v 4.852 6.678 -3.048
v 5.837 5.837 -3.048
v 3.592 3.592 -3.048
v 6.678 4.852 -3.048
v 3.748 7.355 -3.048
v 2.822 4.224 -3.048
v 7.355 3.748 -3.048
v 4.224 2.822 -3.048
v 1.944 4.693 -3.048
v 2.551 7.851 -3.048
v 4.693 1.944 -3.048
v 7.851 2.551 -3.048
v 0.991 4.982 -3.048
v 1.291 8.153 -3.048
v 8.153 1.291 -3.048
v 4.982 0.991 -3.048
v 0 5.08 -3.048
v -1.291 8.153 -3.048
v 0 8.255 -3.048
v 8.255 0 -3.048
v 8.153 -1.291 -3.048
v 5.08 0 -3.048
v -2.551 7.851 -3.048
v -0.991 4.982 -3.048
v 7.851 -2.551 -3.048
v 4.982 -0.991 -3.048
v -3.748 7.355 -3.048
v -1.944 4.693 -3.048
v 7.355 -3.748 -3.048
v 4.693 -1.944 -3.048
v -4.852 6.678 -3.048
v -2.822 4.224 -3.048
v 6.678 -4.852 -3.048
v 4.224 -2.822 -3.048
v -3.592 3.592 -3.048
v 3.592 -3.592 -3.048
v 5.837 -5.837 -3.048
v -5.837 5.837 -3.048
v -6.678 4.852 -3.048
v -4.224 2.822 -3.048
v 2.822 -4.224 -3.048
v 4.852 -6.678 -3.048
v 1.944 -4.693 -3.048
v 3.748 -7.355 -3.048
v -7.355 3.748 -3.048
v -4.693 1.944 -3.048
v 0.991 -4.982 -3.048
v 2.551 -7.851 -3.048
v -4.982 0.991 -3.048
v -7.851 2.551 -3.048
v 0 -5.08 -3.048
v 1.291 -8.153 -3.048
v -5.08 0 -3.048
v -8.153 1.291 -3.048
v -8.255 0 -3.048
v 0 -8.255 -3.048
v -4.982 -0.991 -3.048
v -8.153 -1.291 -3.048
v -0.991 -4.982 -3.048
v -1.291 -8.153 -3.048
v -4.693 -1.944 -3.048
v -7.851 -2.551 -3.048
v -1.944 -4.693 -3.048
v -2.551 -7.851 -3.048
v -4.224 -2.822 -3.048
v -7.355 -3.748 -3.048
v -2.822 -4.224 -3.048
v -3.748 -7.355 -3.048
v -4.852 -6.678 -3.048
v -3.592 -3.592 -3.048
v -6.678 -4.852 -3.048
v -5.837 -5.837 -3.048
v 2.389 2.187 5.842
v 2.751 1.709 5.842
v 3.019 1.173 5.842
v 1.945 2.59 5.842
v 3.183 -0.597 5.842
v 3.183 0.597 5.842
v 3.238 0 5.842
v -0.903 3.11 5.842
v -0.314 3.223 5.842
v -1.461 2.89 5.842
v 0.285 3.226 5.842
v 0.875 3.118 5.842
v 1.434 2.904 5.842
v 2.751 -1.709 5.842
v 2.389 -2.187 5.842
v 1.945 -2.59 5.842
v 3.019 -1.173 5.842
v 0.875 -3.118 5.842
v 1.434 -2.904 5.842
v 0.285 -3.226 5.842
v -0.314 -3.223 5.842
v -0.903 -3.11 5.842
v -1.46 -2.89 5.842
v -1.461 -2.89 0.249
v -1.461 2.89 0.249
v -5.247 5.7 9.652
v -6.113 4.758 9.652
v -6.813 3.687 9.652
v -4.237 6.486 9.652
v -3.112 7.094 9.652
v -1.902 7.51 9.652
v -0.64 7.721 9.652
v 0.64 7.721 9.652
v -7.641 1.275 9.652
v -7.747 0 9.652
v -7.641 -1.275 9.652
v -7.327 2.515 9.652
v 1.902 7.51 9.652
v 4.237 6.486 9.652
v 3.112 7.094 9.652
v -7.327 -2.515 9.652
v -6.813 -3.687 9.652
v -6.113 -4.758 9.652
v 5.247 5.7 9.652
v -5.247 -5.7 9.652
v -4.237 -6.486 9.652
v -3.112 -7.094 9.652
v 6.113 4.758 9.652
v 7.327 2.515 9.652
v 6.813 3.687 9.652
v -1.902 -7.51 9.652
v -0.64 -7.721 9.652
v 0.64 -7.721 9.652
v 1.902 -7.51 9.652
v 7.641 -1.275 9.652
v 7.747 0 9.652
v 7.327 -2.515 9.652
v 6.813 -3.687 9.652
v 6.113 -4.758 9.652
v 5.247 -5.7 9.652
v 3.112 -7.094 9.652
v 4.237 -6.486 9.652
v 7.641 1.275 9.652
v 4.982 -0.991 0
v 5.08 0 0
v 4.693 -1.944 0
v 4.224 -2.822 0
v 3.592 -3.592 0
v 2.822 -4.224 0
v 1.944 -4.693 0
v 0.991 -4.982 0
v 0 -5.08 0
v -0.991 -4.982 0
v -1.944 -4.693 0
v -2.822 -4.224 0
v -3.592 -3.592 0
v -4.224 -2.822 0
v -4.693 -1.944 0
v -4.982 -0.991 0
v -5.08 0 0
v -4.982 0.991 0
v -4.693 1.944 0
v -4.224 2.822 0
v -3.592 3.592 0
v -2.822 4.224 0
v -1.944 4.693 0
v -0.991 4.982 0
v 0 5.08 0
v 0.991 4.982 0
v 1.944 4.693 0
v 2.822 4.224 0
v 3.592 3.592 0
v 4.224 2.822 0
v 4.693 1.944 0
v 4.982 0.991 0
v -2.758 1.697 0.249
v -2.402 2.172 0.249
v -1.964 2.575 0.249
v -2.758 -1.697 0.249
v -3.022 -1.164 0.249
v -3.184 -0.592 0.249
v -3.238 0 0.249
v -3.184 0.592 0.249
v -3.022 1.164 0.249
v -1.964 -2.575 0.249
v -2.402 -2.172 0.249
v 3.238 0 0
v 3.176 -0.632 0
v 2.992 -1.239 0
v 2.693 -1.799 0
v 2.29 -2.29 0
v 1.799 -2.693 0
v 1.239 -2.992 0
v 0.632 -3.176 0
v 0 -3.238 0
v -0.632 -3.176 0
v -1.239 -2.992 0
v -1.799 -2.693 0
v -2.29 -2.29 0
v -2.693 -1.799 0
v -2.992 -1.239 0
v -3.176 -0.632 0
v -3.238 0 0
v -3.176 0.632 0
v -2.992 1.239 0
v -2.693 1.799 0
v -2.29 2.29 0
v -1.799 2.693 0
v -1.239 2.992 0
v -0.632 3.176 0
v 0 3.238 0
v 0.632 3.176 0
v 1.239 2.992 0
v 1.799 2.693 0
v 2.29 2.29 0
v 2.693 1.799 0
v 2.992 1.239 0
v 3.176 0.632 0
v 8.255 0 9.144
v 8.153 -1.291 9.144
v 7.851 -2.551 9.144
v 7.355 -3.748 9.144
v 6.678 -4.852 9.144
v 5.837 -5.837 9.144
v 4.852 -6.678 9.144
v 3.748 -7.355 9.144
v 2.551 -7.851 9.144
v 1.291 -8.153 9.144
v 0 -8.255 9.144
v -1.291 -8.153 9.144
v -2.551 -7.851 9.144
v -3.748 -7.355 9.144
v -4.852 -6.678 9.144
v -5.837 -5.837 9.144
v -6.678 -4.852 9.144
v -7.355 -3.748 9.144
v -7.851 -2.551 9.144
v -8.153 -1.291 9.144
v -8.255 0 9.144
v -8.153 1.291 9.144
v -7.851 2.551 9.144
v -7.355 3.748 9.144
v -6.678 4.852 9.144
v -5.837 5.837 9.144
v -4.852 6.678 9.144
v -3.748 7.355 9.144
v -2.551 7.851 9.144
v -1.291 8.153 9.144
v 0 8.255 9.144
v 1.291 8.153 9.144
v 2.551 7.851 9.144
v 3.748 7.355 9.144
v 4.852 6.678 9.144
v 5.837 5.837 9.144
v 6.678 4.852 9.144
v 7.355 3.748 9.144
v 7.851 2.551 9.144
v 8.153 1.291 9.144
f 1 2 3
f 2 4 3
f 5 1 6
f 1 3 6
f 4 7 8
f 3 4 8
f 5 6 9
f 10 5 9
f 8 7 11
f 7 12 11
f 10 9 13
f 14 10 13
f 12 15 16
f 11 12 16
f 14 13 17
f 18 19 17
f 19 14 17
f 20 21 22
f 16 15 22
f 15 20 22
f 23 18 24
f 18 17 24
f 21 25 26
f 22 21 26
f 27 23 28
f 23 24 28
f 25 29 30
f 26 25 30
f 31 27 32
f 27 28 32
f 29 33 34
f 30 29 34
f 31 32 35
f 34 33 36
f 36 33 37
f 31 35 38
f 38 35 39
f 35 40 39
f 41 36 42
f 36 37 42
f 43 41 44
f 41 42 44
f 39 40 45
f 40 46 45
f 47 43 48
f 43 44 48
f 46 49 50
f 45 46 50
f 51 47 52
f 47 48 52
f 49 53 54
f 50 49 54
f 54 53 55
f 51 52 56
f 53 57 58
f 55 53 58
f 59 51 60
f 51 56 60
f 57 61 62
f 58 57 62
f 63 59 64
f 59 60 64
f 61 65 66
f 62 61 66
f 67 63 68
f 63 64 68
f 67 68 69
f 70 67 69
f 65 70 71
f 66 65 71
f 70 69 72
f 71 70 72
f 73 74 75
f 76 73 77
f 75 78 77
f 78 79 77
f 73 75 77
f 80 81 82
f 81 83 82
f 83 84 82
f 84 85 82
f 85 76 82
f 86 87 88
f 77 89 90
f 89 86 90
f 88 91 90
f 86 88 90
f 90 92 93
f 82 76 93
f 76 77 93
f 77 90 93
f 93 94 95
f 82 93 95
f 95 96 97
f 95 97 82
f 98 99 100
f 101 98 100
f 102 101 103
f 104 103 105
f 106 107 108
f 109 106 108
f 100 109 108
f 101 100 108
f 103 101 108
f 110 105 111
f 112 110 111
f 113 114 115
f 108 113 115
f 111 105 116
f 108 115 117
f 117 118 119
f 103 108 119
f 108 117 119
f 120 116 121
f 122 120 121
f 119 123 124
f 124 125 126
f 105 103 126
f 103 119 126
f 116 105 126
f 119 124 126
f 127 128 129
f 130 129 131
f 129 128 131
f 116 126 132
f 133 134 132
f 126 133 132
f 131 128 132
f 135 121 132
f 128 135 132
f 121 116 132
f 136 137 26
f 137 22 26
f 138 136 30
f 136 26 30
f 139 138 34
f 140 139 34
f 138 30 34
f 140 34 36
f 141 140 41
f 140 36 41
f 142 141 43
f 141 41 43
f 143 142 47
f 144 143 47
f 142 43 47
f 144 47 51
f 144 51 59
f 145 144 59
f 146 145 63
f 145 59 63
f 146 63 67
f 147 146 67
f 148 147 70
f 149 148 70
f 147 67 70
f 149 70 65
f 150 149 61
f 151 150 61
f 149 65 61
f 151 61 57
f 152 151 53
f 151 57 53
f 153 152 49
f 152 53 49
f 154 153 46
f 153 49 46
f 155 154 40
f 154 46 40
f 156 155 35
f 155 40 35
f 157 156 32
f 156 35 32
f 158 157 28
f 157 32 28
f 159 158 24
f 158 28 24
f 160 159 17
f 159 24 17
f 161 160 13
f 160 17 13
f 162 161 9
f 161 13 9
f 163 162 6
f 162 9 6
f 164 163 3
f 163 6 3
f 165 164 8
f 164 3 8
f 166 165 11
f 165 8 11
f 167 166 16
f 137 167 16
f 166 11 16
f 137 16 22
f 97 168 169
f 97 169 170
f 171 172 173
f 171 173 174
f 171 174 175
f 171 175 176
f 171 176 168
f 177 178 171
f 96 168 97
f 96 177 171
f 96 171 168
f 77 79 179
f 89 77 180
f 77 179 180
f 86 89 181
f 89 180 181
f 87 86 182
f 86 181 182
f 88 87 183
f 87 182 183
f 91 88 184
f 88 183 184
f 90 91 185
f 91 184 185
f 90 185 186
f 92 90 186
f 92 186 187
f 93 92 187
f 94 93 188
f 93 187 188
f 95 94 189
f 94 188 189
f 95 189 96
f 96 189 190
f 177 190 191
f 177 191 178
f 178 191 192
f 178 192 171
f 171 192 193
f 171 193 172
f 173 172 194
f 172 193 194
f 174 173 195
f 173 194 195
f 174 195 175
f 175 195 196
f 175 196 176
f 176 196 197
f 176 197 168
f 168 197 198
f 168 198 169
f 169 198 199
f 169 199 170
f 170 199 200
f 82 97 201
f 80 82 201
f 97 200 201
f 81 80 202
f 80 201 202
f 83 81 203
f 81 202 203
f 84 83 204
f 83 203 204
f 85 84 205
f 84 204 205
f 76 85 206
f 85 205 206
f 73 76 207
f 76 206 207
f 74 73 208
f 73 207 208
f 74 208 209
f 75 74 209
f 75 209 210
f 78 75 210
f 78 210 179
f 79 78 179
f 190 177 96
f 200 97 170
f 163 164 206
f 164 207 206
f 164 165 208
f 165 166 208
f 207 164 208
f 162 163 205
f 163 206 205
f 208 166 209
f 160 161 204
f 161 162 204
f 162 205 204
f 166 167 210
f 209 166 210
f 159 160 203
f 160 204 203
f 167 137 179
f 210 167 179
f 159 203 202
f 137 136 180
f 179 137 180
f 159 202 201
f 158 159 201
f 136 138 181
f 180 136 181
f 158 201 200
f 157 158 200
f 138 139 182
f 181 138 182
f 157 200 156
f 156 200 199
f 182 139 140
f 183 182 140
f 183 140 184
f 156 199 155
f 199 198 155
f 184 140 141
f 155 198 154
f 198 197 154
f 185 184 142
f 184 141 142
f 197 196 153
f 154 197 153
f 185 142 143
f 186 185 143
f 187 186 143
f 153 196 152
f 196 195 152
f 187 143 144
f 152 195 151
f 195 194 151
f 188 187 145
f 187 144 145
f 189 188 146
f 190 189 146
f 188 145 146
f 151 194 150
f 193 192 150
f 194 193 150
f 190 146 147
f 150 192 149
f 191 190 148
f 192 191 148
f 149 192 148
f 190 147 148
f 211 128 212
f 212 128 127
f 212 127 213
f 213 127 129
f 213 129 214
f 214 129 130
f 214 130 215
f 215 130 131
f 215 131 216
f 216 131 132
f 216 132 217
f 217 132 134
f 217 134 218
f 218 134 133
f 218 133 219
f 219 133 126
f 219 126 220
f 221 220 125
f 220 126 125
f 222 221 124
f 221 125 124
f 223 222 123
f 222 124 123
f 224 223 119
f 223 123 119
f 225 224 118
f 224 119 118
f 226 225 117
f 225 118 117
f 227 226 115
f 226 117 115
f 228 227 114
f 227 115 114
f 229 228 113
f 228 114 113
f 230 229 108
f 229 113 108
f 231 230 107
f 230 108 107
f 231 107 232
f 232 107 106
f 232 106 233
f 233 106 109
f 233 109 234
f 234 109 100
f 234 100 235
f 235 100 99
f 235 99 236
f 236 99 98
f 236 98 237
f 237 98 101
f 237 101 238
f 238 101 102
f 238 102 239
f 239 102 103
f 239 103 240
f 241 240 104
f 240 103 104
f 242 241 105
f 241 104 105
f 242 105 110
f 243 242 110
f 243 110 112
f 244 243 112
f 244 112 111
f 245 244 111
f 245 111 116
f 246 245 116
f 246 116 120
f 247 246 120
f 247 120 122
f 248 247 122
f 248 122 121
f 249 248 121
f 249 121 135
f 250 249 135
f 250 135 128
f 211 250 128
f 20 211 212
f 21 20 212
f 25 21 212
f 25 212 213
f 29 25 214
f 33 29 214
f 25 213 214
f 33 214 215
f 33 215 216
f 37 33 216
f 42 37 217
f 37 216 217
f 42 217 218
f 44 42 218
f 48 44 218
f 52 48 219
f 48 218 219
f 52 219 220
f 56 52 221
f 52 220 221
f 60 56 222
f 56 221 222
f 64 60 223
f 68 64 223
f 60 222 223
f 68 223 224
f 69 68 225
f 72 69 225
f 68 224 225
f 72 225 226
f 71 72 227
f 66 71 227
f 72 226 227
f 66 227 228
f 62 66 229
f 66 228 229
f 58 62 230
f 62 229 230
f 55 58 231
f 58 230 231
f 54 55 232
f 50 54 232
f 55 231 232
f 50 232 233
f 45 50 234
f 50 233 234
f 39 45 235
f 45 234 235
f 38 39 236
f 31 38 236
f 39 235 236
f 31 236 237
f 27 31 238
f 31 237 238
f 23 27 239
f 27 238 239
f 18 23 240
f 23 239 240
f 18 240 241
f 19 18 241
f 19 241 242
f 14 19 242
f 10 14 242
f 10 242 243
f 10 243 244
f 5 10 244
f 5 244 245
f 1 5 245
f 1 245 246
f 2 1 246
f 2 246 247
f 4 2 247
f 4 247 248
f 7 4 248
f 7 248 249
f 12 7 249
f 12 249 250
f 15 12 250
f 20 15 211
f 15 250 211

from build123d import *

# Parameters (mm, degrees)
F0_W     = 3.048
F0_H     = 5.842
F2_DEPTH = 3.81
F3_SIZE  = 0.508


with BuildPart() as f1:
    # F0 (on Front) → F1 (revolve)
    with BuildSketch(Plane.XZ):
        Polygon((0, 9.652), (0, 5.842), (3.2385, 5.842), (3.2385, 0), (5.08, 0), (5.08, -3.048), (8.255, -3.048), (8.255, 9.652), align=None)
    revolve(axis=Axis((0, 0, 7.747), (0, 0, -1)))

    # F0 (on Front) → F2 (join, symmetric)
    with BuildSketch(Plane.XZ):
        with Locations((-2.9845, 3.1697918537)):
            Rectangle(F0_W, F0_H)
    extrude(amount=F2_DEPTH, both=True)

    # F3
    f3_edges = [f1.edges().sort_by_distance(p)[0] for p in [
        (-8.255, 0, 9.652),
    ]]
    chamfer(f3_edges, length=F3_SIZE)


solid = f1.part
